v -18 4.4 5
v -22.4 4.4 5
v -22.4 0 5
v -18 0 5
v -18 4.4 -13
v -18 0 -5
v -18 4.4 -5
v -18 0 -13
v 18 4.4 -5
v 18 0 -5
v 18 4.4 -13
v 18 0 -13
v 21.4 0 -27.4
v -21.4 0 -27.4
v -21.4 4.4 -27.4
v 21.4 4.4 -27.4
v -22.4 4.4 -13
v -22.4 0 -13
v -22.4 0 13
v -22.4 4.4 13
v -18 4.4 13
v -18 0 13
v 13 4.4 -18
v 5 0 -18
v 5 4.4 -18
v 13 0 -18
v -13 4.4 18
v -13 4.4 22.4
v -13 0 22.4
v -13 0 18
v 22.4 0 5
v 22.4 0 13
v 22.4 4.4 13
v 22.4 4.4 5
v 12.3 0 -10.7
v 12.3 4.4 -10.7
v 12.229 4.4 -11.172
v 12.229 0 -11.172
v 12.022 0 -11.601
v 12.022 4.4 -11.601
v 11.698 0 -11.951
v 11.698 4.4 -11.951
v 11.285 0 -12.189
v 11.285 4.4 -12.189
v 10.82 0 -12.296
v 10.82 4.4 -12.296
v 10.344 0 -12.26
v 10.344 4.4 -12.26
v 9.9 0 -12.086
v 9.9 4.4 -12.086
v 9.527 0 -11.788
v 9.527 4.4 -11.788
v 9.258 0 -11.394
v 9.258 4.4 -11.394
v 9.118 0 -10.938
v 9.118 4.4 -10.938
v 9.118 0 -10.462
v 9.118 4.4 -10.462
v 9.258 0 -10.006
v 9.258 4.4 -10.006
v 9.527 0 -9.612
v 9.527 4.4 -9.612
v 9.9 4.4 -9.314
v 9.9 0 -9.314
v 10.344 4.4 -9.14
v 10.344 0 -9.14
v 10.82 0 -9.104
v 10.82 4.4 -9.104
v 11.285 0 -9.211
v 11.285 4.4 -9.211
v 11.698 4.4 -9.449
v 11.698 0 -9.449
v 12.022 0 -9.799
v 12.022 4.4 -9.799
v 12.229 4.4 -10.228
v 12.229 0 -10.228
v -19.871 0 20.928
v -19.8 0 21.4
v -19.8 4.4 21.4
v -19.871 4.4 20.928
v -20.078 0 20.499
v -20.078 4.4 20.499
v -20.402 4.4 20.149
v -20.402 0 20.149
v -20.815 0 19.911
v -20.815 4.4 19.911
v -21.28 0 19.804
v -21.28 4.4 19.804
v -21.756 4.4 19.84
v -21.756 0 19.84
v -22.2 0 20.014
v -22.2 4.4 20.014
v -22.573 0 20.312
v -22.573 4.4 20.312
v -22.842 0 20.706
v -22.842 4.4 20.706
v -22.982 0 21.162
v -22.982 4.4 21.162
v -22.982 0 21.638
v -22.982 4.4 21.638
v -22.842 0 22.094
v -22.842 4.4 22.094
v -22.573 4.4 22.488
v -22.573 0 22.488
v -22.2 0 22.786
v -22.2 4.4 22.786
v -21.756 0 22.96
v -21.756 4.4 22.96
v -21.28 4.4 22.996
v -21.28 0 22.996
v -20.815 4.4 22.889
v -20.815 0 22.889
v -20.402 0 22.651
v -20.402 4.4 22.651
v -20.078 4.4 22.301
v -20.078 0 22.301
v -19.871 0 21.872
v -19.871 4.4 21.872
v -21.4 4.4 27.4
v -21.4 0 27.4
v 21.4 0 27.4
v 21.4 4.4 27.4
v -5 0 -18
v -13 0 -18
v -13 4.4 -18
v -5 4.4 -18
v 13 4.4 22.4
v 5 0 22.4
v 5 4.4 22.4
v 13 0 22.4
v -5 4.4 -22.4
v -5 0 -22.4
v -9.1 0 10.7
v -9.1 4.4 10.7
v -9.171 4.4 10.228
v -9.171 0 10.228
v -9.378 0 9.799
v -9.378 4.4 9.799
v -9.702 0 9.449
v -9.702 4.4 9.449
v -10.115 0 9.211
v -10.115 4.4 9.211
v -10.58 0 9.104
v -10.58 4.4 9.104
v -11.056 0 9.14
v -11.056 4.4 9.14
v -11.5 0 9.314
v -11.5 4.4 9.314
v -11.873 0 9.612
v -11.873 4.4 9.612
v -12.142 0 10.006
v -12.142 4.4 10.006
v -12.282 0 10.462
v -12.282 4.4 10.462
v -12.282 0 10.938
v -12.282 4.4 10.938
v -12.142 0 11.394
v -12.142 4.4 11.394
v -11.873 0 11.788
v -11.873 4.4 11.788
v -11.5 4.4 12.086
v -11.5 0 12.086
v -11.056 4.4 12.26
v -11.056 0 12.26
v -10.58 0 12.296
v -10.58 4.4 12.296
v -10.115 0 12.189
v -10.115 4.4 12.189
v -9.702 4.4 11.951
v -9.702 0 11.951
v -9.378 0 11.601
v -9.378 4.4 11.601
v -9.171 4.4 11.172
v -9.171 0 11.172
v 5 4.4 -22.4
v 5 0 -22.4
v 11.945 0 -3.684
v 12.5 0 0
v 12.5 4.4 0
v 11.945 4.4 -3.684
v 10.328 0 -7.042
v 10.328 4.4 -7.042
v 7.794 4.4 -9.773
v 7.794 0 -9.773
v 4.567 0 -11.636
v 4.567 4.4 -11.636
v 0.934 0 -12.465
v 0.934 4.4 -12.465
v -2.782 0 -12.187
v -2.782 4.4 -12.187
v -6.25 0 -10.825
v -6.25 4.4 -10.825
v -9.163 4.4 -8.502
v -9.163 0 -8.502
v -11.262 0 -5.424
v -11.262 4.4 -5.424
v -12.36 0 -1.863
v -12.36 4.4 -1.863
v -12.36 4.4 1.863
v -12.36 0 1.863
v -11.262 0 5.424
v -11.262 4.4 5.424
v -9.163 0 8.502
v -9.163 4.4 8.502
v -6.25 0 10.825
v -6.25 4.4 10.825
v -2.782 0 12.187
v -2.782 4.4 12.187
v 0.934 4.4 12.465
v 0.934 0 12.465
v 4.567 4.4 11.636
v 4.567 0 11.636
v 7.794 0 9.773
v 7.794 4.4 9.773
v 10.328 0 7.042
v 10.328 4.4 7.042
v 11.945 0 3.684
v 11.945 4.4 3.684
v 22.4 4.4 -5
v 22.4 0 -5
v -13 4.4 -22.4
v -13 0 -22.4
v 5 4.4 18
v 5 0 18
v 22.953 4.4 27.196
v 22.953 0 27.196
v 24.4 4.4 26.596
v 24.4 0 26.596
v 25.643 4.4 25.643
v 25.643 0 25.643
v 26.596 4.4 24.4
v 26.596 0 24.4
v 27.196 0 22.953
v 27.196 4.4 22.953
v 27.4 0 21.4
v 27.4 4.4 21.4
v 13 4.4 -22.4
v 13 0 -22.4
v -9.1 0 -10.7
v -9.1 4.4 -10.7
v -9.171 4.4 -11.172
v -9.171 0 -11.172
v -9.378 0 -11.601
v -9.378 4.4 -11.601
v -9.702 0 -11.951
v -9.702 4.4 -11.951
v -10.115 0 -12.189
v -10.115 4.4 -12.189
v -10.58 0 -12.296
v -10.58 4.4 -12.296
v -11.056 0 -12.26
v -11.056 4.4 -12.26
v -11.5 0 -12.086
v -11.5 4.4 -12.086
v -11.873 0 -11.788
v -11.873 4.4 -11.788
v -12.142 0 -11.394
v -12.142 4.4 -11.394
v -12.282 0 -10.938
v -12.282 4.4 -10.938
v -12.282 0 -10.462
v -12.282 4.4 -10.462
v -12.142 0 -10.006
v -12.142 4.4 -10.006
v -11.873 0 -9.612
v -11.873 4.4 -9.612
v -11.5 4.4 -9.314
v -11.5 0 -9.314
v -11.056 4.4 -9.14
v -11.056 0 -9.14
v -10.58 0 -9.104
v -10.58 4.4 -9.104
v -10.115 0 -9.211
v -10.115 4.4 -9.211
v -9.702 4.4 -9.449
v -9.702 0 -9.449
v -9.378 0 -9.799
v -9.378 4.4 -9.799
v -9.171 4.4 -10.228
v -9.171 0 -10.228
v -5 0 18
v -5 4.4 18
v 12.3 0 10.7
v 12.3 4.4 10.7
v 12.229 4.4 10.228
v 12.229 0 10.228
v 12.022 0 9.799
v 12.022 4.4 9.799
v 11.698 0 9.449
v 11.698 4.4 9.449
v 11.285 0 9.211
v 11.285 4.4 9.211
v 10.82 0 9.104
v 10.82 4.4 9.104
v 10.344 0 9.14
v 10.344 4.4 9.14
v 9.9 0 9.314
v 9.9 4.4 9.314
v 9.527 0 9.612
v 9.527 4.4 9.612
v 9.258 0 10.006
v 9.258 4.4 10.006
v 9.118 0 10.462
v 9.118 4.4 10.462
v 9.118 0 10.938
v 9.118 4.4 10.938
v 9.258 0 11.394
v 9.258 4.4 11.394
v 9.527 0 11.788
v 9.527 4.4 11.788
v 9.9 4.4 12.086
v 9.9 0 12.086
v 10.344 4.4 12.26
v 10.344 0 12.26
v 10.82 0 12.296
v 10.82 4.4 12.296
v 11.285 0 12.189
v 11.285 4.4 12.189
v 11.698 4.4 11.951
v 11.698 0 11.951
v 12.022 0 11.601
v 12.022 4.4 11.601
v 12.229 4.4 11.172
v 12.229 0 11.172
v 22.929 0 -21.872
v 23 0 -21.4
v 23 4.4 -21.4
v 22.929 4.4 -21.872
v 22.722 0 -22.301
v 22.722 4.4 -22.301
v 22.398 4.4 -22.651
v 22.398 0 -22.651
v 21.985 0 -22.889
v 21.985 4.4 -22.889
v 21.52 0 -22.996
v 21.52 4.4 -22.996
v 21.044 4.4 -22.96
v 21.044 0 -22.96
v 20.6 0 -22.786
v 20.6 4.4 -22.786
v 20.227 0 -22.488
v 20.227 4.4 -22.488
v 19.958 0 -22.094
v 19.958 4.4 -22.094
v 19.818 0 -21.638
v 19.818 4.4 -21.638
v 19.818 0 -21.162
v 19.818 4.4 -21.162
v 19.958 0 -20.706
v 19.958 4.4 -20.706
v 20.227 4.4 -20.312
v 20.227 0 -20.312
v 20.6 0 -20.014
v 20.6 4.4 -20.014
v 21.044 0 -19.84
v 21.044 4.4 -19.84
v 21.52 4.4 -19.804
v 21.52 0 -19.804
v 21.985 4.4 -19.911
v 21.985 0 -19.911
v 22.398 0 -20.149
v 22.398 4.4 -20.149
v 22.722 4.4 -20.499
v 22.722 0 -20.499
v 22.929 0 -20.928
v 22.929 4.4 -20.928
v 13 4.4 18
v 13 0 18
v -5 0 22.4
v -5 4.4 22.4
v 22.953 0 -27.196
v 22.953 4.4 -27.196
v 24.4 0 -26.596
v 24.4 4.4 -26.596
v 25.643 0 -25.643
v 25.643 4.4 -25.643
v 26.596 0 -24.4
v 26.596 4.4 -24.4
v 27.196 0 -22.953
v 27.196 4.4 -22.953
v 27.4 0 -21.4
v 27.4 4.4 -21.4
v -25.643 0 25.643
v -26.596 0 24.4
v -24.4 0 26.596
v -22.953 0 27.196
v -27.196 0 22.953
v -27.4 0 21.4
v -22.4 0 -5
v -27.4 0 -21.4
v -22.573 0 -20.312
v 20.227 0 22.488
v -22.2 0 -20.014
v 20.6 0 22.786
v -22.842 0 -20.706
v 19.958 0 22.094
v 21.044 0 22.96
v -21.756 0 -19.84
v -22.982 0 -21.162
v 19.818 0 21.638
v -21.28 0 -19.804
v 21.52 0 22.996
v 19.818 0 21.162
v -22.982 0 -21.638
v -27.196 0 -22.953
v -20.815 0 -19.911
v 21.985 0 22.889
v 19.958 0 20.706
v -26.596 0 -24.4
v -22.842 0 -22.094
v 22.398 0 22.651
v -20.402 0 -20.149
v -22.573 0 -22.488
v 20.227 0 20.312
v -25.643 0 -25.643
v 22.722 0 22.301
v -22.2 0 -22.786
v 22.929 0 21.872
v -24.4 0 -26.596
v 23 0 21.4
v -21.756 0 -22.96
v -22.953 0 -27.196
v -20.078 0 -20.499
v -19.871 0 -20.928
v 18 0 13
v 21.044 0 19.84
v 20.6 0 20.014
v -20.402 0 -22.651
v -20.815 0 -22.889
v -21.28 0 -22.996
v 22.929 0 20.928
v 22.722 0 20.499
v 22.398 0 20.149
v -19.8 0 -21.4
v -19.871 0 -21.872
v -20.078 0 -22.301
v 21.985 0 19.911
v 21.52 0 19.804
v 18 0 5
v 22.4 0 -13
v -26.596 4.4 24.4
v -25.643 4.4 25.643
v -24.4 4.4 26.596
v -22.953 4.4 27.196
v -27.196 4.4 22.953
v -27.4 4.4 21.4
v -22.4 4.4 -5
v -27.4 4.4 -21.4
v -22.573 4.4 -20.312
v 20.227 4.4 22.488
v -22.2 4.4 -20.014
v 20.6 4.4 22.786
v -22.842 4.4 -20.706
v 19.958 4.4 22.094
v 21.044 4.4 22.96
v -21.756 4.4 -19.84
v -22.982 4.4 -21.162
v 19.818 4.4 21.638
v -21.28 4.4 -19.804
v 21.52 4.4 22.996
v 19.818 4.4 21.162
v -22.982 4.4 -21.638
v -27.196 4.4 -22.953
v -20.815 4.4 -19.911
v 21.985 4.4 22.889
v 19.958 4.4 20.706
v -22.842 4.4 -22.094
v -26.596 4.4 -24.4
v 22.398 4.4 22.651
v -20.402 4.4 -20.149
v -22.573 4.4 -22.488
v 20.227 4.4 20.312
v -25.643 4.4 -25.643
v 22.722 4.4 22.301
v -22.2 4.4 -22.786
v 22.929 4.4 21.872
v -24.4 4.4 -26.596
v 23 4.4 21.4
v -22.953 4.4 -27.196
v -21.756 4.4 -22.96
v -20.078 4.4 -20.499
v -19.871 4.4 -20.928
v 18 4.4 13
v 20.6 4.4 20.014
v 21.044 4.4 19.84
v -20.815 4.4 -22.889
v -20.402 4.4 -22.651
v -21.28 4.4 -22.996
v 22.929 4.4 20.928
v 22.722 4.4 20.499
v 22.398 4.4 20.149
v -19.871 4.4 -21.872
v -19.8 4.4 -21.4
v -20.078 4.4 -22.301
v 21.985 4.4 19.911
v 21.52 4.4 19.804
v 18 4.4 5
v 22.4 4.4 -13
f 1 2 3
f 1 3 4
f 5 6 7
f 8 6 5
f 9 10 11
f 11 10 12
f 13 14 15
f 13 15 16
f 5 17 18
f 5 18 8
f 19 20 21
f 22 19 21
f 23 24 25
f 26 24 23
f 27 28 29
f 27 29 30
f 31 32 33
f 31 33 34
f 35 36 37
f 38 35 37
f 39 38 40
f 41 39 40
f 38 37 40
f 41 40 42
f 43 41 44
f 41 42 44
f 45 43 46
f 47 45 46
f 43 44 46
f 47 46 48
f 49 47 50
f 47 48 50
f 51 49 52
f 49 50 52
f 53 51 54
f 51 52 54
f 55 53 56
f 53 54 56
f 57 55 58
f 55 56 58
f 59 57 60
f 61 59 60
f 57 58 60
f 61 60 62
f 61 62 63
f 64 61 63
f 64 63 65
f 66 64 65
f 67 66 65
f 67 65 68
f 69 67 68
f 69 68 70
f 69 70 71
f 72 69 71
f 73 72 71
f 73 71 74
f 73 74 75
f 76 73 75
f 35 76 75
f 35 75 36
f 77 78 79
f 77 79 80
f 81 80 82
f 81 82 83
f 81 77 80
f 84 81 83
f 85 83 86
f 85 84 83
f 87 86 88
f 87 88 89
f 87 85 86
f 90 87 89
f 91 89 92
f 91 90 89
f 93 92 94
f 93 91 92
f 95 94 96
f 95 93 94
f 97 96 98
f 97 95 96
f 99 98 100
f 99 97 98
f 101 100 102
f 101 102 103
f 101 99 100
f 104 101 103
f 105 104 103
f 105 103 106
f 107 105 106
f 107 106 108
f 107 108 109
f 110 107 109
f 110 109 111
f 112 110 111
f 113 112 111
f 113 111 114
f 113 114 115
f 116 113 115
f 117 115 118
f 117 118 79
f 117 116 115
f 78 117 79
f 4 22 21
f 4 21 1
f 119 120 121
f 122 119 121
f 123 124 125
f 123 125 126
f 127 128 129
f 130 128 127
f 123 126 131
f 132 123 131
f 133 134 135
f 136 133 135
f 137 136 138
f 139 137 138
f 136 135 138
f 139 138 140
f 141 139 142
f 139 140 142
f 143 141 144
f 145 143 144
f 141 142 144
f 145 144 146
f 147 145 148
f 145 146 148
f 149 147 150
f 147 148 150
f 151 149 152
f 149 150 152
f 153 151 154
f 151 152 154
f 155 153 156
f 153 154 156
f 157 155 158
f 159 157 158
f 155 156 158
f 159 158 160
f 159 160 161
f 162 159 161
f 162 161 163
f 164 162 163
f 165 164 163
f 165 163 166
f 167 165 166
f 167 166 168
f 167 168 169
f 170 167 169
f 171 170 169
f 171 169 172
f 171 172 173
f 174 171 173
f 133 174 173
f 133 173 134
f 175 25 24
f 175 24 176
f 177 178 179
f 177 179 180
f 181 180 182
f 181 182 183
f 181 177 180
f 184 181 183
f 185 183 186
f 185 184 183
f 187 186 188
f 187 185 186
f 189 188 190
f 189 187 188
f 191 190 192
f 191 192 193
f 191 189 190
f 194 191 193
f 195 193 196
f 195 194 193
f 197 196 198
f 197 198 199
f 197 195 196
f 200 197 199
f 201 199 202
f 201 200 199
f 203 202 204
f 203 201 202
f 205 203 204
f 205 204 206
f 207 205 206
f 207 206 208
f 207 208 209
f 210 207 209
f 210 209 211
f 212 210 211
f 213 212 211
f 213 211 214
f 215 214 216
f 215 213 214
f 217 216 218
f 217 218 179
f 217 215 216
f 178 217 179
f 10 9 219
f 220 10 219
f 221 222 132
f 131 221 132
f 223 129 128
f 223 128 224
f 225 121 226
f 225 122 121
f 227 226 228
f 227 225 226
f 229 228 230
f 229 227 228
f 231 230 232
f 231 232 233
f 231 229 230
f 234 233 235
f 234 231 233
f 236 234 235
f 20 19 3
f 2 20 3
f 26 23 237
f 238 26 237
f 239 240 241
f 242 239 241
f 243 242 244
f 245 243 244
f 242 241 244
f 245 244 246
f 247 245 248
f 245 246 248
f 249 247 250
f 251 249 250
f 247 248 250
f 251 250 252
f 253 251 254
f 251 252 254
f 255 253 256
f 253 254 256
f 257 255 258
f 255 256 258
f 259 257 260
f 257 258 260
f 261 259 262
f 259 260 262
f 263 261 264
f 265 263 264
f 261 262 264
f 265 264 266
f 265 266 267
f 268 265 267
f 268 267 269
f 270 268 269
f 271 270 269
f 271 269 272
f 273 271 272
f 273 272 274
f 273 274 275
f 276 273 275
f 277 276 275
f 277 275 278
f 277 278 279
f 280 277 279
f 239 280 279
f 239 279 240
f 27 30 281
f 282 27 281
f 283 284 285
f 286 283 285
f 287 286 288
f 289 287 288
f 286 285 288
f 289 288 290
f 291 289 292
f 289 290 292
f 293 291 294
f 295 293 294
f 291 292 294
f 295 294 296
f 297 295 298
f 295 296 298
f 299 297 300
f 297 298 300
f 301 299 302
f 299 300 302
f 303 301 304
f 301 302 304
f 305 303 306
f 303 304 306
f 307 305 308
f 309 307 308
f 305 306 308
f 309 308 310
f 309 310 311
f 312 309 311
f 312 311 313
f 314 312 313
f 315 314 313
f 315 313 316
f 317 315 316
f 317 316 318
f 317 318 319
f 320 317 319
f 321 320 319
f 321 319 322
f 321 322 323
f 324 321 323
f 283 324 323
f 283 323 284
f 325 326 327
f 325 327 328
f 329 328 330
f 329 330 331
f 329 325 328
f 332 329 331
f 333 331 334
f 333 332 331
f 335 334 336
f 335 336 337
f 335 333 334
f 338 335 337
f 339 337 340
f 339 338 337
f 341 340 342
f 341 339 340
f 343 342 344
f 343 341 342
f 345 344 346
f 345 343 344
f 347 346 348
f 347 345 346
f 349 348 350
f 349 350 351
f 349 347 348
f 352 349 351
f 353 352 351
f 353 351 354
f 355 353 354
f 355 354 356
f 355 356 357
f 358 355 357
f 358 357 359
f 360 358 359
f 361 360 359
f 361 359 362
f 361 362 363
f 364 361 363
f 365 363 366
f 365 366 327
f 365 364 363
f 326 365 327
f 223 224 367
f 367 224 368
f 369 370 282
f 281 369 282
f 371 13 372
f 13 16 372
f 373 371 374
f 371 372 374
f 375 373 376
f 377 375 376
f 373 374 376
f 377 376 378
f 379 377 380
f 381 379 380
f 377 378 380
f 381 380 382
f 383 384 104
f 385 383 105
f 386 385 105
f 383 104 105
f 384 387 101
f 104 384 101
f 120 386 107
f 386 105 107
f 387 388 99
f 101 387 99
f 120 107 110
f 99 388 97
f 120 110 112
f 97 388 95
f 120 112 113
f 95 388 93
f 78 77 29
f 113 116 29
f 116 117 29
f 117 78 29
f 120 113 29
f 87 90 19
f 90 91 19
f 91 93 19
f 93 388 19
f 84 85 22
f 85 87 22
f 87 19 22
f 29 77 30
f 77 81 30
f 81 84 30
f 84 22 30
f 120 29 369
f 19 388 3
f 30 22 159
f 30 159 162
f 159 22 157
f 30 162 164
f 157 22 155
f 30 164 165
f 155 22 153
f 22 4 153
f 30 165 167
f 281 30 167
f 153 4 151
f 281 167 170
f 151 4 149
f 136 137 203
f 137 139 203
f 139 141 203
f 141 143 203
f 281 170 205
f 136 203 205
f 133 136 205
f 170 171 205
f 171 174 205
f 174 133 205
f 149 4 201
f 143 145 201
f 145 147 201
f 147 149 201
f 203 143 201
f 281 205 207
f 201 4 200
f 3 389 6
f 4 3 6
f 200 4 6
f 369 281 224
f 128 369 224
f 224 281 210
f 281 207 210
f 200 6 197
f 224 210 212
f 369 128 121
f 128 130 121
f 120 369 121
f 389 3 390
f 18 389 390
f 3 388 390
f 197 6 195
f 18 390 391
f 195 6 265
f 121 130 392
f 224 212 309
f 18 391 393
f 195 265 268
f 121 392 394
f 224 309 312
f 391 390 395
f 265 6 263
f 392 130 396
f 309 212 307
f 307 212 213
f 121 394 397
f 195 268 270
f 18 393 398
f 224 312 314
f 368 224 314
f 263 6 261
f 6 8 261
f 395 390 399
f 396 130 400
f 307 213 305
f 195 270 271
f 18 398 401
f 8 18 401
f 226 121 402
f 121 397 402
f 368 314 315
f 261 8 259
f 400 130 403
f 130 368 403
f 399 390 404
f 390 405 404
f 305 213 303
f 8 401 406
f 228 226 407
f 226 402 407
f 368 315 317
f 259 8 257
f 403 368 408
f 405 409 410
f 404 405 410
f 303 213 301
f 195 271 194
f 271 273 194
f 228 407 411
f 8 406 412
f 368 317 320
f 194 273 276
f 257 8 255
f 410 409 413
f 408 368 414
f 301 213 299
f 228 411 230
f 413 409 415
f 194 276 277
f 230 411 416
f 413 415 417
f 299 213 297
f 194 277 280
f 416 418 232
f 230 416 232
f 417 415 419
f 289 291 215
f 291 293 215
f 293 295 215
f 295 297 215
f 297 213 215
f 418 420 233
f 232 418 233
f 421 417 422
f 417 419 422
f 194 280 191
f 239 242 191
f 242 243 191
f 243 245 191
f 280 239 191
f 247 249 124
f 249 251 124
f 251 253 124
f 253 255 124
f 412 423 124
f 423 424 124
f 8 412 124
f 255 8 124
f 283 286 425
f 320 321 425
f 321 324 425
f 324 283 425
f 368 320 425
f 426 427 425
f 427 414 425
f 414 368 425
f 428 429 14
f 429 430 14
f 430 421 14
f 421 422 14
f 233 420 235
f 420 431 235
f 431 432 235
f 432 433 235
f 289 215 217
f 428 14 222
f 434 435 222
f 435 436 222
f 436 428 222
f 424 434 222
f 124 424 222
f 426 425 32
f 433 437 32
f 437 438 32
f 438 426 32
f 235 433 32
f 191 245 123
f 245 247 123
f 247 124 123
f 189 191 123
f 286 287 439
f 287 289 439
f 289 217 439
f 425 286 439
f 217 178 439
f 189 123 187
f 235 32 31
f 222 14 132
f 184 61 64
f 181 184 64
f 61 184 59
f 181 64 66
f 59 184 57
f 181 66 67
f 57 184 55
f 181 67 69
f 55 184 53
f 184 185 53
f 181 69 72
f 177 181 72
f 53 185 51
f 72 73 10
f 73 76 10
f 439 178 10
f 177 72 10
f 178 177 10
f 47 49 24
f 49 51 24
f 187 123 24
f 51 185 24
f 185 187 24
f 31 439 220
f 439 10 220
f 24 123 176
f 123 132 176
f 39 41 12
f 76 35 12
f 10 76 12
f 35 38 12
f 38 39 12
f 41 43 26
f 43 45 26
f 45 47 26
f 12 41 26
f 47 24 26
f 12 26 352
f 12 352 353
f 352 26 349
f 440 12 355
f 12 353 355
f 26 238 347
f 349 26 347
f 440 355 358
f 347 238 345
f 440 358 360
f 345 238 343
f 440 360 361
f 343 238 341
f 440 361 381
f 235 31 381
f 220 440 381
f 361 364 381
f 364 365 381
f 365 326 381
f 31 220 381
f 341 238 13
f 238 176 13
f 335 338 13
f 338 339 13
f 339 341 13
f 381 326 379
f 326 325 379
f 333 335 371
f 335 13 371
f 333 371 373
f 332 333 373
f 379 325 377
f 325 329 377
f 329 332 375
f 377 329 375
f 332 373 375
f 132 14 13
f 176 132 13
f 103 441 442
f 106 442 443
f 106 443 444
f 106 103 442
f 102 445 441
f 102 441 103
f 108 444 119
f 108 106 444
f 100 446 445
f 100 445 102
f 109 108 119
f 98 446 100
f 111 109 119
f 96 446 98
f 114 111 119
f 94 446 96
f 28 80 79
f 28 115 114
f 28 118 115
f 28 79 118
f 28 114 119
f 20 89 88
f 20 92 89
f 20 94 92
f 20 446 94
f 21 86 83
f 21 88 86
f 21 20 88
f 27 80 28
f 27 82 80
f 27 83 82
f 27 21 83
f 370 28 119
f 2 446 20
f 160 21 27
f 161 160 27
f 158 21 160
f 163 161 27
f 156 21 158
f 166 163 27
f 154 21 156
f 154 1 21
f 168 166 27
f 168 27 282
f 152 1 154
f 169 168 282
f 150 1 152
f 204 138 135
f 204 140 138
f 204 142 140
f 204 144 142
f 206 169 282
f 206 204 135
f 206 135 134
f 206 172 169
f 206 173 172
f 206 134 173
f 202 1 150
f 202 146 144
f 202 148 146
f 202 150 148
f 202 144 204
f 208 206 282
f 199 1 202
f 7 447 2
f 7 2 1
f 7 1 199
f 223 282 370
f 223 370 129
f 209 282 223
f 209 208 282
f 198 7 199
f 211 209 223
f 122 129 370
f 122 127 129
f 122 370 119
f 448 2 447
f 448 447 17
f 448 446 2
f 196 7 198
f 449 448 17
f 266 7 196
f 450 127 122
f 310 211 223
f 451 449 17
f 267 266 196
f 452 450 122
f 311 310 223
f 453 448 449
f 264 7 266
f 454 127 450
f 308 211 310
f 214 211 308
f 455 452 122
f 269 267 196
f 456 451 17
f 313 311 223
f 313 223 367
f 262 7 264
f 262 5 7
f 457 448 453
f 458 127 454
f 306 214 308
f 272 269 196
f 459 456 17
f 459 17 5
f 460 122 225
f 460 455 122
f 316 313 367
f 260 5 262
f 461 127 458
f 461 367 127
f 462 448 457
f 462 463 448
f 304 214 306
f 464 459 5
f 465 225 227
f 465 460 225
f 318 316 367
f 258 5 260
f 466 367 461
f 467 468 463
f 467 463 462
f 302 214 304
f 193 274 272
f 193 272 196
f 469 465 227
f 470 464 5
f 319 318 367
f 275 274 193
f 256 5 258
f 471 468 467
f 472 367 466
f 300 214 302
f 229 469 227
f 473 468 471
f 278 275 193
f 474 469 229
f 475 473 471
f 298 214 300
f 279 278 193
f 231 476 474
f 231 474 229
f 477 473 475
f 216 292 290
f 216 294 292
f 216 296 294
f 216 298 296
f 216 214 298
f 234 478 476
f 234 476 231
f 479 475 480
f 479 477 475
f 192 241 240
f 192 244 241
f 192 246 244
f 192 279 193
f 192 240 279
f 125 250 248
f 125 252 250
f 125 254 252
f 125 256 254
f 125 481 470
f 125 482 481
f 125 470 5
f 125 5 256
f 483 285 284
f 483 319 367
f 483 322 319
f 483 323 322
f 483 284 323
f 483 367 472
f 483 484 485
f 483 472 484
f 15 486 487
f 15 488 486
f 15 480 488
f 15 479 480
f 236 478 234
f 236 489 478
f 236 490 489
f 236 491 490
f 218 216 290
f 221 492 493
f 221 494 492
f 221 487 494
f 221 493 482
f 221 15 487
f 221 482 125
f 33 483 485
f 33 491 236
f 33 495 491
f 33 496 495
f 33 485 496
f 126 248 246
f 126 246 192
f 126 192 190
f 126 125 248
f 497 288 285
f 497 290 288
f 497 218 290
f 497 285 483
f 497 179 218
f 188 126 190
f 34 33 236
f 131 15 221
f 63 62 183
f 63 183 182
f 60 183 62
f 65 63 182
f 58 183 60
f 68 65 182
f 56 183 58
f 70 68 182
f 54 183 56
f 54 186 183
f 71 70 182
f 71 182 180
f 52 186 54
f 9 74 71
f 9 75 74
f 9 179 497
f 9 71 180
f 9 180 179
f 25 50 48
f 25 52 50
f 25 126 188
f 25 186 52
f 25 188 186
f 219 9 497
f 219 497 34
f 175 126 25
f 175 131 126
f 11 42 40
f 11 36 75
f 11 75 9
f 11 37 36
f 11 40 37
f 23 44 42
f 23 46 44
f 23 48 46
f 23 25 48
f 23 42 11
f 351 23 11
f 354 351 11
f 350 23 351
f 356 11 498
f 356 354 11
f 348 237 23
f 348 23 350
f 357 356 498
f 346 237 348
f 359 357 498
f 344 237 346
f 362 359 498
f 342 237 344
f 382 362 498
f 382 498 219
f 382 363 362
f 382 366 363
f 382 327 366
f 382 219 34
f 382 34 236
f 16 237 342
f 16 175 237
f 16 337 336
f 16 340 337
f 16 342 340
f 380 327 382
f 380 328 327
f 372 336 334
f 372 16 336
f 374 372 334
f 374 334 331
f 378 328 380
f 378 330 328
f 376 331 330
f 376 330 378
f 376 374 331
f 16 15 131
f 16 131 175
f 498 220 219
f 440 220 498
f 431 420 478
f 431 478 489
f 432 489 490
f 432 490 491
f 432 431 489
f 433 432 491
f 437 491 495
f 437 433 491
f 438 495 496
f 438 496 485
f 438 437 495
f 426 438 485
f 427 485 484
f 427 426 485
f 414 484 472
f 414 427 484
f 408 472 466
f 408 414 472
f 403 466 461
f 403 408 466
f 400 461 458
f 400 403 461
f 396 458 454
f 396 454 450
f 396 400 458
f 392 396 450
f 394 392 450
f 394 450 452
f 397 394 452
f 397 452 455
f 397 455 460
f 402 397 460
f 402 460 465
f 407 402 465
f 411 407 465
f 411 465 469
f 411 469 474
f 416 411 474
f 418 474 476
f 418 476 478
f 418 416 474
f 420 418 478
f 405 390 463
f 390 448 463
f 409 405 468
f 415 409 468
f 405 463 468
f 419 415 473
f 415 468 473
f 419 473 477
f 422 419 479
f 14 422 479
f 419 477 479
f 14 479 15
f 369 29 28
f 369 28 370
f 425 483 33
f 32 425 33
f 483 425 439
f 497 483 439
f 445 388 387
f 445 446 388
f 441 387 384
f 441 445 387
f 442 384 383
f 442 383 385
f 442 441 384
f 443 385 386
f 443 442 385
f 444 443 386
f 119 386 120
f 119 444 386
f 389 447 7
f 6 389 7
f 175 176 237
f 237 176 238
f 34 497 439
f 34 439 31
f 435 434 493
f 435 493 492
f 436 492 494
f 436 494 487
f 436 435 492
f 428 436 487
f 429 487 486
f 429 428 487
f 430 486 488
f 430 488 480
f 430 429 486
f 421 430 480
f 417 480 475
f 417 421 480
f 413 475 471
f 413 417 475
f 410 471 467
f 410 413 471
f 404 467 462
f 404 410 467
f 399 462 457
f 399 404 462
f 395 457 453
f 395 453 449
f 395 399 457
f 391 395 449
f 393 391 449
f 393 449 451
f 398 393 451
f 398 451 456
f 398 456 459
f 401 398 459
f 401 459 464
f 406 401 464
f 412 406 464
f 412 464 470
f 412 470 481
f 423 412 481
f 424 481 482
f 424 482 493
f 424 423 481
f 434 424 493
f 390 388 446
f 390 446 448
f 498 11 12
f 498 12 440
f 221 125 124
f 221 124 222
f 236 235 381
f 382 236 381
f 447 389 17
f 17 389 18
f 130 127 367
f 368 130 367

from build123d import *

# Parameters (mm, degrees)
SKETCH_1_W          = 54.8
SKETCH_1_H          = 54.8
SKETCH_1_R          = 12.5
SKETCH_1_R_2        = 1.6
SKETCH_1_W_2        = 4.4
SKETCH_1_H_2        = 8
SKETCH_1_W_3        = 8
SKETCH_1_H_3        = 4.4
EXTRUDE_1_DEPTH     = 4.4
FILLET_1_R          = 6
SKETCH_2_R          = 1.6
CUT_EXTRUDE_1_DEPTH = 10


with BuildPart() as part:
    # 草图1 → 凸台-拉伸1 (new body)
    with BuildSketch(Plane(origin=(0, 0, 0), x_dir=(1, 0, 0), z_dir=(0, 1, 0))):
        Rectangle(SKETCH_1_W, SKETCH_1_H)
        Circle(SKETCH_1_R, mode=Mode.SUBTRACT)
        with Locations((21.4, 21.4)):
            Circle(SKETCH_1_R_2, mode=Mode.SUBTRACT)
        with Locations((21.4, -21.4)):
            Circle(SKETCH_1_R_2, mode=Mode.SUBTRACT)
        with Locations((-21.4, -21.4)):
            Circle(SKETCH_1_R_2, mode=Mode.SUBTRACT)
        with Locations((-21.4, 21.4)):
            Circle(SKETCH_1_R_2, mode=Mode.SUBTRACT)
        with Locations((20.2, 9)):
            Rectangle(SKETCH_1_W_2, SKETCH_1_H_2, mode=Mode.SUBTRACT)
        with Locations((20.2, -9)):
            Rectangle(SKETCH_1_W_2, SKETCH_1_H_2, mode=Mode.SUBTRACT)
        with Locations((-20.2, -9)):
            Rectangle(SKETCH_1_W_2, SKETCH_1_H_2, mode=Mode.SUBTRACT)
        with Locations((-20.2, 9)):
            Rectangle(SKETCH_1_W_2, SKETCH_1_H_2, mode=Mode.SUBTRACT)
        with Locations((9, 20.2)):
            Rectangle(SKETCH_1_W_3, SKETCH_1_H_3, mode=Mode.SUBTRACT)
        with Locations((9, -20.2)):
            Rectangle(SKETCH_1_W_3, SKETCH_1_H_3, mode=Mode.SUBTRACT)
        with Locations((-9, -20.2)):
            Rectangle(SKETCH_1_W_3, SKETCH_1_H_3, mode=Mode.SUBTRACT)
        with Locations((-9, 20.2)):
            Rectangle(SKETCH_1_W_3, SKETCH_1_H_3, mode=Mode.SUBTRACT)
    extrude(amount=EXTRUDE_1_DEPTH)

    # 圆角1
    fillet_1_edges = [part.edges().sort_by_distance(p)[0] for p in [
        (27.4, 2.2, 27.4),
        (-27.4, 2.2, 27.4),
        (-27.4, 2.2, -27.4),
        (27.4, 2.2, -27.4),
    ]]
    fillet(fillet_1_edges, radius=FILLET_1_R)

    # 草图2 → 切除-拉伸1 (cut)
    with BuildSketch(Plane(origin=(0, 4.4, 0), x_dir=(1, 0, 0), z_dir=(0, 1, 0))):
        with Locations((10.7, 10.7)):
            Circle(SKETCH_2_R)
        with Locations((10.7, -10.7)):
            Circle(SKETCH_2_R)
        with Locations((-10.7, -10.7)):
            Circle(SKETCH_2_R)
        with Locations((-10.7, 10.7)):
            Circle(SKETCH_2_R)
    extrude(amount=-CUT_EXTRUDE_1_DEPTH, mode=Mode.SUBTRACT)


solid = part.part
